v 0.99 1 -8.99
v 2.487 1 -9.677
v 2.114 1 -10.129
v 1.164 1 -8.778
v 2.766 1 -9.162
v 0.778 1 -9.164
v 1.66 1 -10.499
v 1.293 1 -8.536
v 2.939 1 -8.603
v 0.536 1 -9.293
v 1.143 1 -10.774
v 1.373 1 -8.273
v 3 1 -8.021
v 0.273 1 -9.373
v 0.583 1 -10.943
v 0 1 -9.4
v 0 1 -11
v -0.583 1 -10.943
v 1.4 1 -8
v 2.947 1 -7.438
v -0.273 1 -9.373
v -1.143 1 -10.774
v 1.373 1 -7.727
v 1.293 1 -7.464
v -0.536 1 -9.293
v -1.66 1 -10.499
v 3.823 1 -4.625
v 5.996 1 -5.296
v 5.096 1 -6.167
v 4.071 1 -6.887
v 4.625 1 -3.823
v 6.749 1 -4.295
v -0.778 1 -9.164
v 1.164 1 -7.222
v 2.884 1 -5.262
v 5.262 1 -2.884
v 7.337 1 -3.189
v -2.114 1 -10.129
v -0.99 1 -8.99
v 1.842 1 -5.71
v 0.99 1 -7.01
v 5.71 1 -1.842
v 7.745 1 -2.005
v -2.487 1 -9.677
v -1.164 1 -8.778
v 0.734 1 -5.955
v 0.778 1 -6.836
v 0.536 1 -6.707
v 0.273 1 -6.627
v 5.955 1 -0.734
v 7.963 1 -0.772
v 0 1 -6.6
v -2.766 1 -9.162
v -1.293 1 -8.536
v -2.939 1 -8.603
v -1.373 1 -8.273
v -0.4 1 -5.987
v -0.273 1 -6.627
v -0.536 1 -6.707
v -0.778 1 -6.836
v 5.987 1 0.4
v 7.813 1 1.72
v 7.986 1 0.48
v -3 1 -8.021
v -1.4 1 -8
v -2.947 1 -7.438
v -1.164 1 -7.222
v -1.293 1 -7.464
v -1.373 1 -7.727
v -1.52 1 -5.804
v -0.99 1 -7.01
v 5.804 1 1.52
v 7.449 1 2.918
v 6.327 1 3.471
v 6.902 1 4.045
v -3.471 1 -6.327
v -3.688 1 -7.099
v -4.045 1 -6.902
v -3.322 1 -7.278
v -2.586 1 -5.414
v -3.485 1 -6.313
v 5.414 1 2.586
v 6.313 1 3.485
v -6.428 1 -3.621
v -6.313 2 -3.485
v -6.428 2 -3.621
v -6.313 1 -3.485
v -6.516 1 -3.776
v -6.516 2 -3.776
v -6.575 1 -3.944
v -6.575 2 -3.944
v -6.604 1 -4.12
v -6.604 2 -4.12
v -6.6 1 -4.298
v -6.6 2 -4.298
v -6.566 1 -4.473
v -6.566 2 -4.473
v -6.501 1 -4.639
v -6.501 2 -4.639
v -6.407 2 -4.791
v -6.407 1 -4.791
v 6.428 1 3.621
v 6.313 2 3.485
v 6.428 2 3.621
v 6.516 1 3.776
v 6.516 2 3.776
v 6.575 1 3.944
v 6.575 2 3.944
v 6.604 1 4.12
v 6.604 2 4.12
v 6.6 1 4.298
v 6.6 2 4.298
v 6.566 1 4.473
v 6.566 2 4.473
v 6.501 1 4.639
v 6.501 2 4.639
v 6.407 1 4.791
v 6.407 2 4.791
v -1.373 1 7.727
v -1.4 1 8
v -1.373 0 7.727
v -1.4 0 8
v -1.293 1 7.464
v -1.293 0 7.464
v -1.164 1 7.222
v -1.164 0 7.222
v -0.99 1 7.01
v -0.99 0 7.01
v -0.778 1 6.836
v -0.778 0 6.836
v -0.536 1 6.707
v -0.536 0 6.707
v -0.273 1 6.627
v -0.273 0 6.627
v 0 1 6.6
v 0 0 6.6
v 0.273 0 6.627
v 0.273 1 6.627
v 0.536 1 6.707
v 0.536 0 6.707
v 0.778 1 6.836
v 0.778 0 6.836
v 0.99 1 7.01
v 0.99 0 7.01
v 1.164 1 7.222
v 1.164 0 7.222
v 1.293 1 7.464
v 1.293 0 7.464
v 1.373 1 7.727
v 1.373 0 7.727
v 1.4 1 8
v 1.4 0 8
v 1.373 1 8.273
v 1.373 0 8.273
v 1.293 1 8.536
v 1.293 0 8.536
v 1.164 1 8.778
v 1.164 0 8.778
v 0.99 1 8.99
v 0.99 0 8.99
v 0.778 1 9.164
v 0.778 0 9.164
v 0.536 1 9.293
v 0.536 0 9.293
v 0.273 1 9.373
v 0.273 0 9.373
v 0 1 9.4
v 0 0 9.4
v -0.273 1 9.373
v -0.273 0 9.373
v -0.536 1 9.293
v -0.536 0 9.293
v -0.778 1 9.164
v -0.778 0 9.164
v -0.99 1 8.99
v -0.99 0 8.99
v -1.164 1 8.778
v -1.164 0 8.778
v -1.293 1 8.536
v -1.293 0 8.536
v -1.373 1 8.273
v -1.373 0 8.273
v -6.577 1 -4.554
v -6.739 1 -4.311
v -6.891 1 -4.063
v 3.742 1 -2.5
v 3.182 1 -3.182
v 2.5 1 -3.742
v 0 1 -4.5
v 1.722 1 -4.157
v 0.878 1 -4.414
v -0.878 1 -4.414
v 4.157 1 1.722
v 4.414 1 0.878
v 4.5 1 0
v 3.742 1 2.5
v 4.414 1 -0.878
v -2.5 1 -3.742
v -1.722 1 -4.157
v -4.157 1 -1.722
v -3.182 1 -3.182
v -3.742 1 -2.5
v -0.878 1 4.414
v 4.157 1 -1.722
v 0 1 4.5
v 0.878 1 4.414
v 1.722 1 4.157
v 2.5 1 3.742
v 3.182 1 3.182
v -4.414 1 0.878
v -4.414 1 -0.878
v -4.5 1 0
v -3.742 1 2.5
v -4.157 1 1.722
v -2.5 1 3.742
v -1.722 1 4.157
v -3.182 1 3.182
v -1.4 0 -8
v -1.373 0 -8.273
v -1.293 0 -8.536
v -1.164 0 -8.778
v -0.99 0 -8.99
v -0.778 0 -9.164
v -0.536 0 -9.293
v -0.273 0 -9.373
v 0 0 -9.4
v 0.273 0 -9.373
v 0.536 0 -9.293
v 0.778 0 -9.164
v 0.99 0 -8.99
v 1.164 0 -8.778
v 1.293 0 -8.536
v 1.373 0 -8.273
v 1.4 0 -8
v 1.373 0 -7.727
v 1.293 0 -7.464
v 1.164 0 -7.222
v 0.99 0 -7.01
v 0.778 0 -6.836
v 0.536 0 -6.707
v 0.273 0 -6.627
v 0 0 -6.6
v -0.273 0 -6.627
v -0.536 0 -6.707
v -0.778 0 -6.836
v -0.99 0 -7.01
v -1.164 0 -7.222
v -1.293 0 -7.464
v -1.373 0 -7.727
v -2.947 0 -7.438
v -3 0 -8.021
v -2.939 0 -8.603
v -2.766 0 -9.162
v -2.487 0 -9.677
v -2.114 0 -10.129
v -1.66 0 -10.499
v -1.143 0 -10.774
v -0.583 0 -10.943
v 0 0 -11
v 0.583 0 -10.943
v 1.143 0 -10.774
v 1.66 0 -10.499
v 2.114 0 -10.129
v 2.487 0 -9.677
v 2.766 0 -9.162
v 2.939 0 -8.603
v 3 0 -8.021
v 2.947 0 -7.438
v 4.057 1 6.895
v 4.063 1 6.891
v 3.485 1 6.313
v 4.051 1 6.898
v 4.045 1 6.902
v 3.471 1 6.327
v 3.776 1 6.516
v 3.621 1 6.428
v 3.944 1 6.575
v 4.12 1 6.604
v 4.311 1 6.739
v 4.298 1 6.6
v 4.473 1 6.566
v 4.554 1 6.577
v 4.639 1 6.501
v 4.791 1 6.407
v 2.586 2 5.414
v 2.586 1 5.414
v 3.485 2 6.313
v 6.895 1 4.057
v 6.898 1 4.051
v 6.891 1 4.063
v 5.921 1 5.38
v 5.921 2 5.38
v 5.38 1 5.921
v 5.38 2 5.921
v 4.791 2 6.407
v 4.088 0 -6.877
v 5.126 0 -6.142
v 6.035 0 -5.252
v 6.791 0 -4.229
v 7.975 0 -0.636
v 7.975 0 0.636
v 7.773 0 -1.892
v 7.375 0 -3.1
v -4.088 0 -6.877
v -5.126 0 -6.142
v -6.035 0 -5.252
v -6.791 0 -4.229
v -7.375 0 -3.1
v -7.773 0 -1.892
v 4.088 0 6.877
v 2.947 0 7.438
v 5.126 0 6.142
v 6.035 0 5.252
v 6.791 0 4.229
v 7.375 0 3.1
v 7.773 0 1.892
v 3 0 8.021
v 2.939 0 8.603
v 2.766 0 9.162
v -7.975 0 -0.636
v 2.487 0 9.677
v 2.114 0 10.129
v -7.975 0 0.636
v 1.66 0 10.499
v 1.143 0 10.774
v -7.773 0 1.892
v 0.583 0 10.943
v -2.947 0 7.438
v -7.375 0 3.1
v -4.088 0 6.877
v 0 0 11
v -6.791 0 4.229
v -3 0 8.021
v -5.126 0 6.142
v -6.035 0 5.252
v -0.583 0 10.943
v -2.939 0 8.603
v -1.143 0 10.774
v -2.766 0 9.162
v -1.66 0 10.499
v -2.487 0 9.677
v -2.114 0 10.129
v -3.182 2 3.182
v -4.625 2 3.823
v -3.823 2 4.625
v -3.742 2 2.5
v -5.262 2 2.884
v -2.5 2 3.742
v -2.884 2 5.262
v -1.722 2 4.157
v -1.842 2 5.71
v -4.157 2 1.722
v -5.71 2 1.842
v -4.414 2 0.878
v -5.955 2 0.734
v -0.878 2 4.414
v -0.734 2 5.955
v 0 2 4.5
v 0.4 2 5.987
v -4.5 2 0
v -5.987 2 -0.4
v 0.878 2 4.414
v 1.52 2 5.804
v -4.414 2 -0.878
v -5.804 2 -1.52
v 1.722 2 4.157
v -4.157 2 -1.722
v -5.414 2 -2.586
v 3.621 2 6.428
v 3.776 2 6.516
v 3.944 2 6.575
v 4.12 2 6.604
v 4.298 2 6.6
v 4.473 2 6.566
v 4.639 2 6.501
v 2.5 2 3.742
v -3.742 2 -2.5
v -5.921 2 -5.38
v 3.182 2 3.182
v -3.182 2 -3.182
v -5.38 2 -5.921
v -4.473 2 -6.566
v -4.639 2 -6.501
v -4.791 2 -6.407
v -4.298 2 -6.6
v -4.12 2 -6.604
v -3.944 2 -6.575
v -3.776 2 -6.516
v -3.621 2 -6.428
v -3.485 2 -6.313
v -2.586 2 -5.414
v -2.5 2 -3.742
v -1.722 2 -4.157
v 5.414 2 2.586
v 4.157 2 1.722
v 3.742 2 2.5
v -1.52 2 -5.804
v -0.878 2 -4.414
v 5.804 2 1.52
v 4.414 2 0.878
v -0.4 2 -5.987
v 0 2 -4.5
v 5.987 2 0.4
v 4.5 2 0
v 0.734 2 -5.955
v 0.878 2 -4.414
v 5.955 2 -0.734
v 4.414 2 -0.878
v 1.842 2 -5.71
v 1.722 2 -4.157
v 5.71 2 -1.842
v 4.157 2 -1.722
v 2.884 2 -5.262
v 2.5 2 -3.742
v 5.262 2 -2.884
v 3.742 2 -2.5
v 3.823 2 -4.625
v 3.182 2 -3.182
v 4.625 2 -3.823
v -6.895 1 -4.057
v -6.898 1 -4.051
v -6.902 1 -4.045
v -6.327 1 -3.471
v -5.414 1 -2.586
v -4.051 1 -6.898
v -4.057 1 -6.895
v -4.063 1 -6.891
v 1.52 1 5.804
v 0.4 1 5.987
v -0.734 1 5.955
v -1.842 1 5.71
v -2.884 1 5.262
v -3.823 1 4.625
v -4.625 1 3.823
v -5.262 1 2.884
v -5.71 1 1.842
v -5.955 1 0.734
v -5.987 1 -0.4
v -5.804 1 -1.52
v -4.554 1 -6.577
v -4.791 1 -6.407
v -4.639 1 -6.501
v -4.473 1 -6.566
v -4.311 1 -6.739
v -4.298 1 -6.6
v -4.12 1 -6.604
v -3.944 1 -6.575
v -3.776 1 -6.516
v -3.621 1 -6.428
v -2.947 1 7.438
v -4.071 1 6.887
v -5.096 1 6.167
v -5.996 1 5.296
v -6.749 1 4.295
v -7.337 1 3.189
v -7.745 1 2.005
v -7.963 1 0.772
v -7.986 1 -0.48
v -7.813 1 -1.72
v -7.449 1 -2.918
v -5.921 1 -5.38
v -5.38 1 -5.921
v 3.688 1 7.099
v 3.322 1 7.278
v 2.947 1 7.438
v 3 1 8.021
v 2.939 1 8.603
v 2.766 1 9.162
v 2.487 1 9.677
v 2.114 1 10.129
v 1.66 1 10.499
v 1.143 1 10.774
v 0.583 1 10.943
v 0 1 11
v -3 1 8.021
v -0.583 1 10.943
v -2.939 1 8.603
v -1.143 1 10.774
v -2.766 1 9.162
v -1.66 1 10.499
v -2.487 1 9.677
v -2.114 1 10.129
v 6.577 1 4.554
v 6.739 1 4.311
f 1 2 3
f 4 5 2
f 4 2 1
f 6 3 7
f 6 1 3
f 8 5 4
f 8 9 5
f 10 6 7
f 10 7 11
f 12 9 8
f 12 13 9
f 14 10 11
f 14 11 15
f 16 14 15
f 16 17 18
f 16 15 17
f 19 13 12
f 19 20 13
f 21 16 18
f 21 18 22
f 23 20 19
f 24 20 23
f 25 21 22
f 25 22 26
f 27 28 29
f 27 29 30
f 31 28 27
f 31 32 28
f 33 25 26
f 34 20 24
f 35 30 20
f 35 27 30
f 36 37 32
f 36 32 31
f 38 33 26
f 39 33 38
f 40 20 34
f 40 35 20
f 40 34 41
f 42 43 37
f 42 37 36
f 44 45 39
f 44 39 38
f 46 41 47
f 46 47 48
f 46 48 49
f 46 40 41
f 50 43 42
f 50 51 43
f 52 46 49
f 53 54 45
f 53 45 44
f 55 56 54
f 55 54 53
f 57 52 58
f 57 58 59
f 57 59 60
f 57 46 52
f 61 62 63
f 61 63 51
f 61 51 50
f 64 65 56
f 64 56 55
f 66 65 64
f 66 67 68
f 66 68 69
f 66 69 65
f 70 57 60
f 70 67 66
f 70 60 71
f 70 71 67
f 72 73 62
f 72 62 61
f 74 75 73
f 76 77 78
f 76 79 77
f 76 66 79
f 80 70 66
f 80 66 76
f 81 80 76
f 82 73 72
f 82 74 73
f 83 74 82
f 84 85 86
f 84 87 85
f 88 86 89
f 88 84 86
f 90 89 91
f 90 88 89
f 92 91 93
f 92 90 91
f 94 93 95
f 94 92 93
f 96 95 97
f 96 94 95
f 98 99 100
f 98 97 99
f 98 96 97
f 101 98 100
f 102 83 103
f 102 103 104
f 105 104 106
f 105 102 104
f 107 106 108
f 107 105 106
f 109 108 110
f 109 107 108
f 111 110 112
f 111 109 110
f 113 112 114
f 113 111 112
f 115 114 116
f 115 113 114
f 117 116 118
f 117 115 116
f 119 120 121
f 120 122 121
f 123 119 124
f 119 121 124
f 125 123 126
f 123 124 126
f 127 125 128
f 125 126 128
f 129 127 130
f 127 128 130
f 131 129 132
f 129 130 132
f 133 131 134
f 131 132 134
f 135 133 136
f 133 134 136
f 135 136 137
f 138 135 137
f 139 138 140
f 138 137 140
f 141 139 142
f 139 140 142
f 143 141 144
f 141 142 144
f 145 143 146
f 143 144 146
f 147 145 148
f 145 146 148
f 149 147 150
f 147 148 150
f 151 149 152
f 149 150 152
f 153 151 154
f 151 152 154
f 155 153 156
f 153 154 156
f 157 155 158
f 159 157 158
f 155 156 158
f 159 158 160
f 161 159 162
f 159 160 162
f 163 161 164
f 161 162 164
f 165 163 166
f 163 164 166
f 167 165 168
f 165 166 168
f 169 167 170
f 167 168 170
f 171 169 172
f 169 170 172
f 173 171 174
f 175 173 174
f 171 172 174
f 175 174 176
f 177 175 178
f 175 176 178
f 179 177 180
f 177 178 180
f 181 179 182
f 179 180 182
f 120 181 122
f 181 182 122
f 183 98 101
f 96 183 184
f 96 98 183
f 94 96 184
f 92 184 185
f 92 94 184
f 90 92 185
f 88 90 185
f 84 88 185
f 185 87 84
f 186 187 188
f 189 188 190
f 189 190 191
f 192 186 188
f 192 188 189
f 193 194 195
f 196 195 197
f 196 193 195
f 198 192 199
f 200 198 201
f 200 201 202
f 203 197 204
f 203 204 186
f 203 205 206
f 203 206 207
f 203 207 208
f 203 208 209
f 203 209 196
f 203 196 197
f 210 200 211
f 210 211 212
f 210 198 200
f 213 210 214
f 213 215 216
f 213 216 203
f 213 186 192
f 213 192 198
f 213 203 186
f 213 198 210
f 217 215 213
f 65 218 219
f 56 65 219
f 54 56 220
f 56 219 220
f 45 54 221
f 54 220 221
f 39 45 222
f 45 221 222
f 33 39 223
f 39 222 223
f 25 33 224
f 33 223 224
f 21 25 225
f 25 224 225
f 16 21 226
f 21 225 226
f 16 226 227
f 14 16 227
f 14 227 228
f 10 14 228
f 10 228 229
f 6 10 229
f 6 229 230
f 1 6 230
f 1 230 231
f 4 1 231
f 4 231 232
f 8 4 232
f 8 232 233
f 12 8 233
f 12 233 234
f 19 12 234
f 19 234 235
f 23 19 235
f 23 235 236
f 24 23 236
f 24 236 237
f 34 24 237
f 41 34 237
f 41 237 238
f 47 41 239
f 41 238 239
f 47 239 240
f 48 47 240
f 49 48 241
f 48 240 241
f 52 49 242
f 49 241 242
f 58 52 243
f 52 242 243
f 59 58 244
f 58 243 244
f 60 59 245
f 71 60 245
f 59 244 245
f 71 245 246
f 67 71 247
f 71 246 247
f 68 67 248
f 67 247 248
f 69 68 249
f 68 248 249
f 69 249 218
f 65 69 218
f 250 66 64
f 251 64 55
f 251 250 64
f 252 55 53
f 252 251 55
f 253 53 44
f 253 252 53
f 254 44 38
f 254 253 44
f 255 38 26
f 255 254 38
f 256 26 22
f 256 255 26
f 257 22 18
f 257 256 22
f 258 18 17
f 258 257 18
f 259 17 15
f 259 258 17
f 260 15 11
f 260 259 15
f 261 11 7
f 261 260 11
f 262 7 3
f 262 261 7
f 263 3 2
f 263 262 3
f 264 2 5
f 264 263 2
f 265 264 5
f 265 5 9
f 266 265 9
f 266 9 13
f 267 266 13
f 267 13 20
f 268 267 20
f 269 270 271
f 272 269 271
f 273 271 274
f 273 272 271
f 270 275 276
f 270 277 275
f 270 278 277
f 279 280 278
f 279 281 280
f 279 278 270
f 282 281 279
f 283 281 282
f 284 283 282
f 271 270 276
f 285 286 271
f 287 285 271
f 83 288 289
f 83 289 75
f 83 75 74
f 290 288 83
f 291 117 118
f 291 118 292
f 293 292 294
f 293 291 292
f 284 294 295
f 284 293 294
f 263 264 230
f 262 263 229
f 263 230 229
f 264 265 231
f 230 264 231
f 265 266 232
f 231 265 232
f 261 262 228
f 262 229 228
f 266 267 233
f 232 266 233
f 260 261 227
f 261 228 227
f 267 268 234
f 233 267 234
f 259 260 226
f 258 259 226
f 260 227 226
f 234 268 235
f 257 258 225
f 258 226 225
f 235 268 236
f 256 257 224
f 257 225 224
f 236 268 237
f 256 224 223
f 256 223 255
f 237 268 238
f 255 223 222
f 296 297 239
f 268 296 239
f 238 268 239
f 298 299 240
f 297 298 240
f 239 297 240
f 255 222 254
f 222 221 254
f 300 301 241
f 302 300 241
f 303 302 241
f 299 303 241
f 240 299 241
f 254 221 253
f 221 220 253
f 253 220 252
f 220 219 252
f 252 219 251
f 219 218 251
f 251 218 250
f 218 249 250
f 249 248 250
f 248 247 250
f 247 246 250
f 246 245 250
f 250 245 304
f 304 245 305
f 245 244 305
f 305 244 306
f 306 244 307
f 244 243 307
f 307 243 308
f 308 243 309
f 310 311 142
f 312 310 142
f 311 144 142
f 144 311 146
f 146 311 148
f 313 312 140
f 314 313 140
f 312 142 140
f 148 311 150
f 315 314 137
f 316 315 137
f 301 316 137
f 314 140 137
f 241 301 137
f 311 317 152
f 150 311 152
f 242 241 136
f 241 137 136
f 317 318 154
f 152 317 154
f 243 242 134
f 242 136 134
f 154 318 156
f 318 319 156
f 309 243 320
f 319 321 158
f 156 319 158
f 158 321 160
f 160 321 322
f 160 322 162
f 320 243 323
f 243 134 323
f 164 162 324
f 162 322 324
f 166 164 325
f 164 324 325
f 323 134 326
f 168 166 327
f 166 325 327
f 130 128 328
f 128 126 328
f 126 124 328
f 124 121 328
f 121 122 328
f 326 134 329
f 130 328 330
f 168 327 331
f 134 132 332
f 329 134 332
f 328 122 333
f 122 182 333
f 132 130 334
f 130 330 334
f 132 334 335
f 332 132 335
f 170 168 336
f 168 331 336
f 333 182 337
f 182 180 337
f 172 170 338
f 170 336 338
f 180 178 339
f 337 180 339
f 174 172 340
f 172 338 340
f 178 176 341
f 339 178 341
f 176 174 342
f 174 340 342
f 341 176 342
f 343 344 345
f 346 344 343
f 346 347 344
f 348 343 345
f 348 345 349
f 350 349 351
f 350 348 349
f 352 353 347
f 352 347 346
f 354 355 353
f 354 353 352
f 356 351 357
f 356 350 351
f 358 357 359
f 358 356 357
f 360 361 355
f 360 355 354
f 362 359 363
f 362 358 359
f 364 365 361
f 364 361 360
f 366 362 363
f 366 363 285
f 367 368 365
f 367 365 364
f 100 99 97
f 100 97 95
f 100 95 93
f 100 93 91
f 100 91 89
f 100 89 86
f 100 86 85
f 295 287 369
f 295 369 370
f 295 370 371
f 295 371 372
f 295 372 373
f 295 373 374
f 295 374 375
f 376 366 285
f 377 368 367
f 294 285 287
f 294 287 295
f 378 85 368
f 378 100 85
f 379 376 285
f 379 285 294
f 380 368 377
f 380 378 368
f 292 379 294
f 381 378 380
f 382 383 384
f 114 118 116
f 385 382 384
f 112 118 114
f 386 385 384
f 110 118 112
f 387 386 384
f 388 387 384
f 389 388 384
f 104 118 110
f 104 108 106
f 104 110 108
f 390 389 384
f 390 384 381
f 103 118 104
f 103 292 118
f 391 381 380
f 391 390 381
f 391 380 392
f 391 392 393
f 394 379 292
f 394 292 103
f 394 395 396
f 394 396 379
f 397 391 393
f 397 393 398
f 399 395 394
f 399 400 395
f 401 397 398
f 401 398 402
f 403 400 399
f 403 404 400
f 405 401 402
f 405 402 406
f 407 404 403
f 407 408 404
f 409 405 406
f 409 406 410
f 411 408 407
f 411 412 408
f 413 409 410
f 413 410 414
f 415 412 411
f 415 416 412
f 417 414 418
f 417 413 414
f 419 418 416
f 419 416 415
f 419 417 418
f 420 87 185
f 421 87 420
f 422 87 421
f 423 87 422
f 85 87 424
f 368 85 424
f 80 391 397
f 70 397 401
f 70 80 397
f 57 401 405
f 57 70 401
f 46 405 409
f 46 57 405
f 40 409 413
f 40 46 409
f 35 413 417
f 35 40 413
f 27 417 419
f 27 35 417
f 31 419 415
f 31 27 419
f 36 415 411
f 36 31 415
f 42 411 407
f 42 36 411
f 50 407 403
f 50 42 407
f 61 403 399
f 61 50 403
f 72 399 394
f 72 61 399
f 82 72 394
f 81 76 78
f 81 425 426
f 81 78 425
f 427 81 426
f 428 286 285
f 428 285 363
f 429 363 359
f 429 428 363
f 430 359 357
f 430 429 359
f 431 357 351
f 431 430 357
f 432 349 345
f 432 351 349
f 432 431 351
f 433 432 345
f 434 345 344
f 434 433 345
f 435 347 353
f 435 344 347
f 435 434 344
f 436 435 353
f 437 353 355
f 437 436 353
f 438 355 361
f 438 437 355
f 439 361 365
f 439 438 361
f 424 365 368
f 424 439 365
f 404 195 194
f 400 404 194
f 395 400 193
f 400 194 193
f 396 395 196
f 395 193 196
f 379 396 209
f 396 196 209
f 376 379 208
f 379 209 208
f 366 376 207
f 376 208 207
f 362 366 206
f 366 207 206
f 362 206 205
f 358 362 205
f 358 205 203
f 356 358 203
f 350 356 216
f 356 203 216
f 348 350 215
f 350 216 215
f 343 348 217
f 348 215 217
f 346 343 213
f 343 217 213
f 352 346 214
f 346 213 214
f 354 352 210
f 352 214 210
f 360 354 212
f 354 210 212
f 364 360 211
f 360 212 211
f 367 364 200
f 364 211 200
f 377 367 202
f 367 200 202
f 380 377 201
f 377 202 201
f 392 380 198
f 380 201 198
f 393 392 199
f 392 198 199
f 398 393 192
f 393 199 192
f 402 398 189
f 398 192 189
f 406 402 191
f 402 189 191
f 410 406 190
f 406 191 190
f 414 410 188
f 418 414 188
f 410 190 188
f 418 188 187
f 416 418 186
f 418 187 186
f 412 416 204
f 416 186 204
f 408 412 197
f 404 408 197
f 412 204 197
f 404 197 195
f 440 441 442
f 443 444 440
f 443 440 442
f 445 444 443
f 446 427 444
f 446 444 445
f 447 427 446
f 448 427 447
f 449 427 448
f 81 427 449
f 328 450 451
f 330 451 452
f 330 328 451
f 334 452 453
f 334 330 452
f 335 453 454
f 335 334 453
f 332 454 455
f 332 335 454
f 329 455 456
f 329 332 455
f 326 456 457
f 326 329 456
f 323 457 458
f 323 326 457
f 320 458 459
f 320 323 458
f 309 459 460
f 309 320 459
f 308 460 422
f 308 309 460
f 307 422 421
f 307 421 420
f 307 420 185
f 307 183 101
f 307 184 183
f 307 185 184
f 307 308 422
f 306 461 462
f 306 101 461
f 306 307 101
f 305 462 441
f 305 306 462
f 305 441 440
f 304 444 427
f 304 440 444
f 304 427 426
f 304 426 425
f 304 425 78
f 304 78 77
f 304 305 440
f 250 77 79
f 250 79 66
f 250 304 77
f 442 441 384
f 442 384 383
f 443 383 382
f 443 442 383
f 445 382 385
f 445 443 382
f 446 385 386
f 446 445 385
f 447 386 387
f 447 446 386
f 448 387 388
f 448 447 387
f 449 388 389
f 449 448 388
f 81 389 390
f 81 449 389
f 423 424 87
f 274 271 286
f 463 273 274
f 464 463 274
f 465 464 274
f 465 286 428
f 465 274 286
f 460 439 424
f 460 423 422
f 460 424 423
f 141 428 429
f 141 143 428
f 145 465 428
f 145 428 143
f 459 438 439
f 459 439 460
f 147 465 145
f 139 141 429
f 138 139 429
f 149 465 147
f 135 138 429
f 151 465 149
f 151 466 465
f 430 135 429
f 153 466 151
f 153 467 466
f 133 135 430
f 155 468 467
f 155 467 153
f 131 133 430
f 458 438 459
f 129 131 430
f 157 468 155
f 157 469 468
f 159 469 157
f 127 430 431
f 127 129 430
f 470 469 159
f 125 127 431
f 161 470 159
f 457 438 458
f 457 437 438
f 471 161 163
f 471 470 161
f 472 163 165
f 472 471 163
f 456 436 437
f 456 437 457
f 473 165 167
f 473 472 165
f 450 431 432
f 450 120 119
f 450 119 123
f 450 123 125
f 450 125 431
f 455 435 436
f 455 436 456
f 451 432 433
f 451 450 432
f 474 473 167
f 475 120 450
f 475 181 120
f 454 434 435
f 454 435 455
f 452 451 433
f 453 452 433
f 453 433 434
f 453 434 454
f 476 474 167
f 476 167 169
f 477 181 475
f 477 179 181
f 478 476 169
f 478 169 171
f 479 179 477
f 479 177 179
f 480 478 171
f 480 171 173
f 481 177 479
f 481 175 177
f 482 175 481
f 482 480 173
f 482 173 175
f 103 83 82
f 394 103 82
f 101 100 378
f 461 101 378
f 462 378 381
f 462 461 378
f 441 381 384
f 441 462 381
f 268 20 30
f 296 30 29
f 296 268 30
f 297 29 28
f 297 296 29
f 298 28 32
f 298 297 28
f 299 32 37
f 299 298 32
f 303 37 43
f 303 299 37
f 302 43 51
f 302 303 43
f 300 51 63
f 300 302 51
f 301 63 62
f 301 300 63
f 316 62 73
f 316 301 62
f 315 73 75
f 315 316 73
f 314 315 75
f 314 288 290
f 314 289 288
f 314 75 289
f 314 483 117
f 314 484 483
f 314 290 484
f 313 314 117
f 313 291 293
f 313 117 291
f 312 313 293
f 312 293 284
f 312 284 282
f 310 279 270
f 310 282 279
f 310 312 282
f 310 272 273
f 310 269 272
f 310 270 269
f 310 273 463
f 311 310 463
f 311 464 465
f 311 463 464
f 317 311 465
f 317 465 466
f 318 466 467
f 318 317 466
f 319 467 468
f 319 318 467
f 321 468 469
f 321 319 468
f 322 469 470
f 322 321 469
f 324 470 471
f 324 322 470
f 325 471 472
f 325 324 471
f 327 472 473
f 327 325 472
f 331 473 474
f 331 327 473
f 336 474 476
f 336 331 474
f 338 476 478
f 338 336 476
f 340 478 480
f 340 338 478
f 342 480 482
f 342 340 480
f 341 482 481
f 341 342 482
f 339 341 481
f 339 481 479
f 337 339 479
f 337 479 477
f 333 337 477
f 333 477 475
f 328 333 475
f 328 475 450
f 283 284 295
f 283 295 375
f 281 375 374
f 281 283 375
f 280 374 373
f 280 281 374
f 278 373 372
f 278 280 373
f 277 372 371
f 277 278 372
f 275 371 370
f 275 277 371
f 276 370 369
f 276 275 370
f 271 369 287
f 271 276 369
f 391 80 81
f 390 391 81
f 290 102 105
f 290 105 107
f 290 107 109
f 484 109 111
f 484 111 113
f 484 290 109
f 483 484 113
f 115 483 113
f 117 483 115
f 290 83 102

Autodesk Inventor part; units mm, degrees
ref_plane "YZ Plane" through (0, 0, 0) normal (1, 0, 0) x (0, 1, 0)
ref_plane "XZ Plane" through (0, 0, 0) normal (0, 1, 0) x (-1, 0, 0)
ref_plane "XY Plane" through (0, 0, 0) normal (0, 0, 1) x (1, 0, 0)
sketch "Sketch1" plane through (0, 0, 0) normal (0, 1, 0) x (-1, 0, 0)
  circle A0 centre (0, 0) radius 8
  circle A1 centre (0, -8) radius 3
  circle A2 centre (0, 8) radius 3
  line L0 (0, 8) -> (0, -8)
  circle A3 centre (0, 8) radius 1.4
  circle A4 centre (0, -8) radius 1.4
  line L1 (0, 11) -> (0, -11) construction
  point P0 (-2.9468, -7.4375)
  point P1 (2.9468, -7.4375)
  point P2 (2.9468, 7.4375)
  point P3 (-2.9468, 7.4375)
  dimension "d2" = 6
  dimension "d0" = 16
  dimension "d3" = 2.8
  dimension "d4" = 22
extrude "Extrusion1" add sketch "Sketch1" along normal blind 1 contours A0 A1 L0 A2 | A2 L0 A3 A0 | A0 A3 A2 | A1 A0 A4 | A0 A4 L0 A1 | L0 A1 A0 A2 | A2 A0 A3 L0 | L0 A4 A0 A1
sketch "Sketch2" plane through (0, 1, 0) normal (0, 1, 0) x (1, 0, 0)
  circle A0 centre (0, 0) radius 6
  circle A1 centre (0, 0) radius 4.5
  arc A2 (-2.9468, 7.4375) -> (-2.9468, -7.4375) centre (0, 0) ccw projected
  line L0 (-5.6569, 5.6569) -> (5.6569, -5.6569) construction
  arc A3 (2.9468, -7.4375) -> (2.9468, 7.4375) centre (0, 0) ccw projected
  line L1 (-7.0711, 4.2426) -> (4.2426, -7.0711)
  line L2 (7.0711, -4.2426) -> (-4.2426, 7.0711)
  arc A4 (-4.2426, 7.0711) -> (-7.0711, 4.2426) centre (-5.6569, 5.6569) ccw
  arc A5 (4.2426, -7.0711) -> (7.0711, -4.2426) centre (5.6569, -5.6569) ccw
  circle A6 centre (0, 8) radius 1.4 projected
  line L3 (0, 0) -> (0, 8) construction
  point P0 (5.4142, -2.5858)
  point P1 (-2.5858, 5.4142)
  point P2 (-4.063, 6.8914)
  point P3 (-6.8914, 4.063)
  point P4 (-5.4142, 2.5858)
  point P5 (2.5858, -5.4142)
  point P6 (4.063, -6.8914)
  point P7 (6.8914, -4.063)
  dimension "d7" = 12
  dimension "d8" = 9
  dimension "d9" = 4
  dimension "d10" = 45
extrude "Extrusion2" add sketch "Sketch2" along normal blind 1 contours A0 L2 A1 | L2 A1 L1 A0 | A0 L1 A2 L2 | L2 A3 L1 A0 | A0 L1 A1 L2 | L1 A1 A0
fillet "Fillet1" radius 1 4 edges at (4.063, 1.5, 6.8914) (6.8914, 1.5, 4.063) (-4.063, 1.5, -6.8914) (-6.8914, 1.5, -4.063)
properties part number "Ш.03.Створка" material "ABS Plastic"
